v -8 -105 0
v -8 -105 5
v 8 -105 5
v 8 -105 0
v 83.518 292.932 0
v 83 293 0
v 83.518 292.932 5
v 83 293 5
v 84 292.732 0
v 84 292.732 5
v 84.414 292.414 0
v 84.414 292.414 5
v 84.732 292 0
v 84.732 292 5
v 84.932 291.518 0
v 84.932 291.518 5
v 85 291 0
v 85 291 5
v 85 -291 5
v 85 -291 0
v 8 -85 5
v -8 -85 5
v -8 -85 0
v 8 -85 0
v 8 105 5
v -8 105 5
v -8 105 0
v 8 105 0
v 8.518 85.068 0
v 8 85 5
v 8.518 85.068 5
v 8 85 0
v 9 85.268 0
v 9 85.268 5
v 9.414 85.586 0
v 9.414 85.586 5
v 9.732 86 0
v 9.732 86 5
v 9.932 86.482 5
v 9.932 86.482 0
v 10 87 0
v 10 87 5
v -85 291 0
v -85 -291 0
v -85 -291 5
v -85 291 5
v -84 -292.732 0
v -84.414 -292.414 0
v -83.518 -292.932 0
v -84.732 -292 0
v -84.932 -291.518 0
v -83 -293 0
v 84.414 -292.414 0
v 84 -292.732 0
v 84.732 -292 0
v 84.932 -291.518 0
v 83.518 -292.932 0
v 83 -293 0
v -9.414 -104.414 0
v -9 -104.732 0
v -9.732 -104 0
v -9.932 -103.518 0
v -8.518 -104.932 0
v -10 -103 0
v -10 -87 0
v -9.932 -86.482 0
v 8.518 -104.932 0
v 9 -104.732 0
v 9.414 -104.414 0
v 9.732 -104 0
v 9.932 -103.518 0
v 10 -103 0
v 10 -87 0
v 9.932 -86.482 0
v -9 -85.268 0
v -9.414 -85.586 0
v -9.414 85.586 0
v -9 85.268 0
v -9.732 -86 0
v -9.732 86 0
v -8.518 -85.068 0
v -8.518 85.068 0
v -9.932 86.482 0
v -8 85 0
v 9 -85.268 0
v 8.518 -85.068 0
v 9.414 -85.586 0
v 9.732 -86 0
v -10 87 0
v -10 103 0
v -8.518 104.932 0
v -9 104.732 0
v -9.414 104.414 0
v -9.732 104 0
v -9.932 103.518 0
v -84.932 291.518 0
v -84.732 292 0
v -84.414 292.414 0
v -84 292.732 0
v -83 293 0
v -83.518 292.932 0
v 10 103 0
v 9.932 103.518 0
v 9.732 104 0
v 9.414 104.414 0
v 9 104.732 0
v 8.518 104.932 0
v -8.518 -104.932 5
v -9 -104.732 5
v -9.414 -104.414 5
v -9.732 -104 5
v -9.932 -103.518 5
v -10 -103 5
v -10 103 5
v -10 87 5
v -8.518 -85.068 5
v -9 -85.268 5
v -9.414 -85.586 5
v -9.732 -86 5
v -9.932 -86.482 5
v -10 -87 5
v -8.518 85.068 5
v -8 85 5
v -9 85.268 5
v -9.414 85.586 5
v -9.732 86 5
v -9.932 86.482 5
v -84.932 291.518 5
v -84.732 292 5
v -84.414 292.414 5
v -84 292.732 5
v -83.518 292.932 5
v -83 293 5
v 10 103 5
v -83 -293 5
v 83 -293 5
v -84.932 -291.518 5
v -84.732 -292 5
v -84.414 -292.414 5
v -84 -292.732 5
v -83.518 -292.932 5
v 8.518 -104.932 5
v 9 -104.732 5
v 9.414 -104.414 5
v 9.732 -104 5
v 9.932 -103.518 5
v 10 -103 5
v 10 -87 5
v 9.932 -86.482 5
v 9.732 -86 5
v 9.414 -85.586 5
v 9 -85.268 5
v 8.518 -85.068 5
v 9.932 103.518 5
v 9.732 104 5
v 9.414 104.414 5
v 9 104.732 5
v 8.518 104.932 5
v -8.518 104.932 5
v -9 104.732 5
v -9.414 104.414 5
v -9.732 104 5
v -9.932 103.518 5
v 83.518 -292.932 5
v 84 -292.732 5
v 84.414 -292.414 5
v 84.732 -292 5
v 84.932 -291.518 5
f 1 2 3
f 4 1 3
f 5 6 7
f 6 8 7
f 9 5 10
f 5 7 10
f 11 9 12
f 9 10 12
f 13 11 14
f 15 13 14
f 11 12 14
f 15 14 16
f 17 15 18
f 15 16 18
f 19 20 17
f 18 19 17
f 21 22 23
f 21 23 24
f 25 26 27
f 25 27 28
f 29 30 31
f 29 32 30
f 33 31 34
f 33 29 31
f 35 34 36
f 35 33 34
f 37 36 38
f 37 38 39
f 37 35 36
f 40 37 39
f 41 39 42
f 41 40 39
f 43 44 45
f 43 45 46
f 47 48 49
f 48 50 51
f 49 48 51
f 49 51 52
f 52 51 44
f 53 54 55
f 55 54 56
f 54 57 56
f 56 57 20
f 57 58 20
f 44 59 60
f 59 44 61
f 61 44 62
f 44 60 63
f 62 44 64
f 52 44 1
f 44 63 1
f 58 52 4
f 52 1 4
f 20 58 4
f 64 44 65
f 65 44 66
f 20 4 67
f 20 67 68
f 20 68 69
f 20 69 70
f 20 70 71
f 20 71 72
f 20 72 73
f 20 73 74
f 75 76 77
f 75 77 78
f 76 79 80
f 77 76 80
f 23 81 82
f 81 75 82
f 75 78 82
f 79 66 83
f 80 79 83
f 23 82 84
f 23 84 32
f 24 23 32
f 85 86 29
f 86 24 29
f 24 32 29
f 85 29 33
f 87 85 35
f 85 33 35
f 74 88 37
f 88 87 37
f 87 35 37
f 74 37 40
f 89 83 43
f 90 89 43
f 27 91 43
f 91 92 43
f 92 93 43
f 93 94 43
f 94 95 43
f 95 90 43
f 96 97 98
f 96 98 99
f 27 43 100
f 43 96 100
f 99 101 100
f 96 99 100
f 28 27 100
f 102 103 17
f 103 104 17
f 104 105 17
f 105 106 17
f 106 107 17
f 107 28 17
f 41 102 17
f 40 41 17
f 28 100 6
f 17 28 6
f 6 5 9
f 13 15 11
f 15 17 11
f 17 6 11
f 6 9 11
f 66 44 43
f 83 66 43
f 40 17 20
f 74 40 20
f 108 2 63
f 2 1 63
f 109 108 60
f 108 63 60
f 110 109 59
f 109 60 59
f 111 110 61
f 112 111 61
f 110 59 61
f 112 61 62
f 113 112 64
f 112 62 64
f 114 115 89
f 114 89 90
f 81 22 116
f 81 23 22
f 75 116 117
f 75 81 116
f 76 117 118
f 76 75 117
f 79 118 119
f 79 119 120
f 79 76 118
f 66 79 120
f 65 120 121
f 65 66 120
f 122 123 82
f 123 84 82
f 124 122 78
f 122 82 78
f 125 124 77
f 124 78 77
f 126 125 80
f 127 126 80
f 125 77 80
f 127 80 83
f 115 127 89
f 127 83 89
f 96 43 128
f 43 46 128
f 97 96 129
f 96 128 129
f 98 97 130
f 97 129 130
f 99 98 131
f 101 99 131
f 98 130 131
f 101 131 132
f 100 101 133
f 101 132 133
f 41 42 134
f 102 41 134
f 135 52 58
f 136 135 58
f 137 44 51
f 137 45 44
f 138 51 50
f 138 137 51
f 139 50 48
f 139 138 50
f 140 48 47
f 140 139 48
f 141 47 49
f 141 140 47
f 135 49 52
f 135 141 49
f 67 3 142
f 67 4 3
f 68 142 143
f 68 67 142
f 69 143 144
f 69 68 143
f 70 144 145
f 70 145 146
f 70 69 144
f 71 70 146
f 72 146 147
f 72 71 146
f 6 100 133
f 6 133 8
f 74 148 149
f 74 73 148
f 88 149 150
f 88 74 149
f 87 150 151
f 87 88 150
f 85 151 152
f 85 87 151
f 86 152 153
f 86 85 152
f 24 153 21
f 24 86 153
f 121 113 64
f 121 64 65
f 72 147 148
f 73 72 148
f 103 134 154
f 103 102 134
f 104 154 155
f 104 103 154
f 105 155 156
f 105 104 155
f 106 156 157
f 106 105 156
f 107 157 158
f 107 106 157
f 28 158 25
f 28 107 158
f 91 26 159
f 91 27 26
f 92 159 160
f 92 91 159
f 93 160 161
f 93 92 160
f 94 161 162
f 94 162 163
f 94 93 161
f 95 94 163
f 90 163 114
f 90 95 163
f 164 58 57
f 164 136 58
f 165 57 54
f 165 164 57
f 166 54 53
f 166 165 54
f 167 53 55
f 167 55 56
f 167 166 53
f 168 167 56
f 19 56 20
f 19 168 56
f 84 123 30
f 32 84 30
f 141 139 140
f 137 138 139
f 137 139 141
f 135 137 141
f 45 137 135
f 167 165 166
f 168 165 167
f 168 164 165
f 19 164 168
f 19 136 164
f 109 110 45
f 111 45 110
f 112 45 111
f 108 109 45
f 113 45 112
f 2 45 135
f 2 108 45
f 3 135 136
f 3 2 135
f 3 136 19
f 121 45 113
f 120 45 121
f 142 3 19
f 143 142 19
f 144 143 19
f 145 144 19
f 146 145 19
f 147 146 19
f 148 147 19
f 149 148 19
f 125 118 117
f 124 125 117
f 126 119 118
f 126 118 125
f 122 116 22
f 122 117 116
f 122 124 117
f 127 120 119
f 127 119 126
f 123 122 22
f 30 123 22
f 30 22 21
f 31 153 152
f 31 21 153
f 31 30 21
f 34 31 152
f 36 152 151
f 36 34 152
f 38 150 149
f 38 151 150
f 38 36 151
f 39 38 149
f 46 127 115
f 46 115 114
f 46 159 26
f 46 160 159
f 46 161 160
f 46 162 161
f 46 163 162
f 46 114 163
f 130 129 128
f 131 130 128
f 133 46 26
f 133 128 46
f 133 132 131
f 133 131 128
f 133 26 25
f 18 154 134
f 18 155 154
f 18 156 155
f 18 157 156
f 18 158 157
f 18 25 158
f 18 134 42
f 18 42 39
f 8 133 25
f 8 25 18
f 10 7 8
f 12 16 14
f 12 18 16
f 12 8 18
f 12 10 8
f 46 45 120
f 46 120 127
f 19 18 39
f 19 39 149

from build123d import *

# Parameters (mm, degrees)
F0_W     = 170
F0_H     = 586
F1_DEPTH = 5
F2_W     = 20
F2_H     = 20
F3_DEPTH = 25
F4_R     = 2


with BuildPart() as f1:
    # F0 (on Top) → F1 (new body)
    with BuildSketch(Plane.XY):
        Rectangle(F0_W, F0_H)
    extrude(amount=F1_DEPTH)

    # F2 (on face) → F3 (cut)
    with BuildSketch(Plane.XY.offset(5)):
        with Locations((0, 95)):
            Rectangle(F2_W, F2_H)
        with Locations((0, -95)):
            Rectangle(F2_W, F2_H)
    extrude(amount=-F3_DEPTH, mode=Mode.SUBTRACT)

    # F4
    f4_edges = [f1.edges().sort_by_distance(p)[0] for p in [
        (-85, -293, 2.5),
        (85, -293, 2.5),
        (85, 293, 2.5),
        (-10, 105, 2.5),
        (-10, -85, 2.5),
        (-10, 85, 2.5),
        (-10, -105, 2.5),
        (10, 105, 2.5),
        (-85, 293, 2.5),
        (10, -85, 2.5),
        (10, -105, 2.5),
        (10, 85, 2.5),
    ]]
    fillet(f4_edges, radius=F4_R)


solid = f1.part
